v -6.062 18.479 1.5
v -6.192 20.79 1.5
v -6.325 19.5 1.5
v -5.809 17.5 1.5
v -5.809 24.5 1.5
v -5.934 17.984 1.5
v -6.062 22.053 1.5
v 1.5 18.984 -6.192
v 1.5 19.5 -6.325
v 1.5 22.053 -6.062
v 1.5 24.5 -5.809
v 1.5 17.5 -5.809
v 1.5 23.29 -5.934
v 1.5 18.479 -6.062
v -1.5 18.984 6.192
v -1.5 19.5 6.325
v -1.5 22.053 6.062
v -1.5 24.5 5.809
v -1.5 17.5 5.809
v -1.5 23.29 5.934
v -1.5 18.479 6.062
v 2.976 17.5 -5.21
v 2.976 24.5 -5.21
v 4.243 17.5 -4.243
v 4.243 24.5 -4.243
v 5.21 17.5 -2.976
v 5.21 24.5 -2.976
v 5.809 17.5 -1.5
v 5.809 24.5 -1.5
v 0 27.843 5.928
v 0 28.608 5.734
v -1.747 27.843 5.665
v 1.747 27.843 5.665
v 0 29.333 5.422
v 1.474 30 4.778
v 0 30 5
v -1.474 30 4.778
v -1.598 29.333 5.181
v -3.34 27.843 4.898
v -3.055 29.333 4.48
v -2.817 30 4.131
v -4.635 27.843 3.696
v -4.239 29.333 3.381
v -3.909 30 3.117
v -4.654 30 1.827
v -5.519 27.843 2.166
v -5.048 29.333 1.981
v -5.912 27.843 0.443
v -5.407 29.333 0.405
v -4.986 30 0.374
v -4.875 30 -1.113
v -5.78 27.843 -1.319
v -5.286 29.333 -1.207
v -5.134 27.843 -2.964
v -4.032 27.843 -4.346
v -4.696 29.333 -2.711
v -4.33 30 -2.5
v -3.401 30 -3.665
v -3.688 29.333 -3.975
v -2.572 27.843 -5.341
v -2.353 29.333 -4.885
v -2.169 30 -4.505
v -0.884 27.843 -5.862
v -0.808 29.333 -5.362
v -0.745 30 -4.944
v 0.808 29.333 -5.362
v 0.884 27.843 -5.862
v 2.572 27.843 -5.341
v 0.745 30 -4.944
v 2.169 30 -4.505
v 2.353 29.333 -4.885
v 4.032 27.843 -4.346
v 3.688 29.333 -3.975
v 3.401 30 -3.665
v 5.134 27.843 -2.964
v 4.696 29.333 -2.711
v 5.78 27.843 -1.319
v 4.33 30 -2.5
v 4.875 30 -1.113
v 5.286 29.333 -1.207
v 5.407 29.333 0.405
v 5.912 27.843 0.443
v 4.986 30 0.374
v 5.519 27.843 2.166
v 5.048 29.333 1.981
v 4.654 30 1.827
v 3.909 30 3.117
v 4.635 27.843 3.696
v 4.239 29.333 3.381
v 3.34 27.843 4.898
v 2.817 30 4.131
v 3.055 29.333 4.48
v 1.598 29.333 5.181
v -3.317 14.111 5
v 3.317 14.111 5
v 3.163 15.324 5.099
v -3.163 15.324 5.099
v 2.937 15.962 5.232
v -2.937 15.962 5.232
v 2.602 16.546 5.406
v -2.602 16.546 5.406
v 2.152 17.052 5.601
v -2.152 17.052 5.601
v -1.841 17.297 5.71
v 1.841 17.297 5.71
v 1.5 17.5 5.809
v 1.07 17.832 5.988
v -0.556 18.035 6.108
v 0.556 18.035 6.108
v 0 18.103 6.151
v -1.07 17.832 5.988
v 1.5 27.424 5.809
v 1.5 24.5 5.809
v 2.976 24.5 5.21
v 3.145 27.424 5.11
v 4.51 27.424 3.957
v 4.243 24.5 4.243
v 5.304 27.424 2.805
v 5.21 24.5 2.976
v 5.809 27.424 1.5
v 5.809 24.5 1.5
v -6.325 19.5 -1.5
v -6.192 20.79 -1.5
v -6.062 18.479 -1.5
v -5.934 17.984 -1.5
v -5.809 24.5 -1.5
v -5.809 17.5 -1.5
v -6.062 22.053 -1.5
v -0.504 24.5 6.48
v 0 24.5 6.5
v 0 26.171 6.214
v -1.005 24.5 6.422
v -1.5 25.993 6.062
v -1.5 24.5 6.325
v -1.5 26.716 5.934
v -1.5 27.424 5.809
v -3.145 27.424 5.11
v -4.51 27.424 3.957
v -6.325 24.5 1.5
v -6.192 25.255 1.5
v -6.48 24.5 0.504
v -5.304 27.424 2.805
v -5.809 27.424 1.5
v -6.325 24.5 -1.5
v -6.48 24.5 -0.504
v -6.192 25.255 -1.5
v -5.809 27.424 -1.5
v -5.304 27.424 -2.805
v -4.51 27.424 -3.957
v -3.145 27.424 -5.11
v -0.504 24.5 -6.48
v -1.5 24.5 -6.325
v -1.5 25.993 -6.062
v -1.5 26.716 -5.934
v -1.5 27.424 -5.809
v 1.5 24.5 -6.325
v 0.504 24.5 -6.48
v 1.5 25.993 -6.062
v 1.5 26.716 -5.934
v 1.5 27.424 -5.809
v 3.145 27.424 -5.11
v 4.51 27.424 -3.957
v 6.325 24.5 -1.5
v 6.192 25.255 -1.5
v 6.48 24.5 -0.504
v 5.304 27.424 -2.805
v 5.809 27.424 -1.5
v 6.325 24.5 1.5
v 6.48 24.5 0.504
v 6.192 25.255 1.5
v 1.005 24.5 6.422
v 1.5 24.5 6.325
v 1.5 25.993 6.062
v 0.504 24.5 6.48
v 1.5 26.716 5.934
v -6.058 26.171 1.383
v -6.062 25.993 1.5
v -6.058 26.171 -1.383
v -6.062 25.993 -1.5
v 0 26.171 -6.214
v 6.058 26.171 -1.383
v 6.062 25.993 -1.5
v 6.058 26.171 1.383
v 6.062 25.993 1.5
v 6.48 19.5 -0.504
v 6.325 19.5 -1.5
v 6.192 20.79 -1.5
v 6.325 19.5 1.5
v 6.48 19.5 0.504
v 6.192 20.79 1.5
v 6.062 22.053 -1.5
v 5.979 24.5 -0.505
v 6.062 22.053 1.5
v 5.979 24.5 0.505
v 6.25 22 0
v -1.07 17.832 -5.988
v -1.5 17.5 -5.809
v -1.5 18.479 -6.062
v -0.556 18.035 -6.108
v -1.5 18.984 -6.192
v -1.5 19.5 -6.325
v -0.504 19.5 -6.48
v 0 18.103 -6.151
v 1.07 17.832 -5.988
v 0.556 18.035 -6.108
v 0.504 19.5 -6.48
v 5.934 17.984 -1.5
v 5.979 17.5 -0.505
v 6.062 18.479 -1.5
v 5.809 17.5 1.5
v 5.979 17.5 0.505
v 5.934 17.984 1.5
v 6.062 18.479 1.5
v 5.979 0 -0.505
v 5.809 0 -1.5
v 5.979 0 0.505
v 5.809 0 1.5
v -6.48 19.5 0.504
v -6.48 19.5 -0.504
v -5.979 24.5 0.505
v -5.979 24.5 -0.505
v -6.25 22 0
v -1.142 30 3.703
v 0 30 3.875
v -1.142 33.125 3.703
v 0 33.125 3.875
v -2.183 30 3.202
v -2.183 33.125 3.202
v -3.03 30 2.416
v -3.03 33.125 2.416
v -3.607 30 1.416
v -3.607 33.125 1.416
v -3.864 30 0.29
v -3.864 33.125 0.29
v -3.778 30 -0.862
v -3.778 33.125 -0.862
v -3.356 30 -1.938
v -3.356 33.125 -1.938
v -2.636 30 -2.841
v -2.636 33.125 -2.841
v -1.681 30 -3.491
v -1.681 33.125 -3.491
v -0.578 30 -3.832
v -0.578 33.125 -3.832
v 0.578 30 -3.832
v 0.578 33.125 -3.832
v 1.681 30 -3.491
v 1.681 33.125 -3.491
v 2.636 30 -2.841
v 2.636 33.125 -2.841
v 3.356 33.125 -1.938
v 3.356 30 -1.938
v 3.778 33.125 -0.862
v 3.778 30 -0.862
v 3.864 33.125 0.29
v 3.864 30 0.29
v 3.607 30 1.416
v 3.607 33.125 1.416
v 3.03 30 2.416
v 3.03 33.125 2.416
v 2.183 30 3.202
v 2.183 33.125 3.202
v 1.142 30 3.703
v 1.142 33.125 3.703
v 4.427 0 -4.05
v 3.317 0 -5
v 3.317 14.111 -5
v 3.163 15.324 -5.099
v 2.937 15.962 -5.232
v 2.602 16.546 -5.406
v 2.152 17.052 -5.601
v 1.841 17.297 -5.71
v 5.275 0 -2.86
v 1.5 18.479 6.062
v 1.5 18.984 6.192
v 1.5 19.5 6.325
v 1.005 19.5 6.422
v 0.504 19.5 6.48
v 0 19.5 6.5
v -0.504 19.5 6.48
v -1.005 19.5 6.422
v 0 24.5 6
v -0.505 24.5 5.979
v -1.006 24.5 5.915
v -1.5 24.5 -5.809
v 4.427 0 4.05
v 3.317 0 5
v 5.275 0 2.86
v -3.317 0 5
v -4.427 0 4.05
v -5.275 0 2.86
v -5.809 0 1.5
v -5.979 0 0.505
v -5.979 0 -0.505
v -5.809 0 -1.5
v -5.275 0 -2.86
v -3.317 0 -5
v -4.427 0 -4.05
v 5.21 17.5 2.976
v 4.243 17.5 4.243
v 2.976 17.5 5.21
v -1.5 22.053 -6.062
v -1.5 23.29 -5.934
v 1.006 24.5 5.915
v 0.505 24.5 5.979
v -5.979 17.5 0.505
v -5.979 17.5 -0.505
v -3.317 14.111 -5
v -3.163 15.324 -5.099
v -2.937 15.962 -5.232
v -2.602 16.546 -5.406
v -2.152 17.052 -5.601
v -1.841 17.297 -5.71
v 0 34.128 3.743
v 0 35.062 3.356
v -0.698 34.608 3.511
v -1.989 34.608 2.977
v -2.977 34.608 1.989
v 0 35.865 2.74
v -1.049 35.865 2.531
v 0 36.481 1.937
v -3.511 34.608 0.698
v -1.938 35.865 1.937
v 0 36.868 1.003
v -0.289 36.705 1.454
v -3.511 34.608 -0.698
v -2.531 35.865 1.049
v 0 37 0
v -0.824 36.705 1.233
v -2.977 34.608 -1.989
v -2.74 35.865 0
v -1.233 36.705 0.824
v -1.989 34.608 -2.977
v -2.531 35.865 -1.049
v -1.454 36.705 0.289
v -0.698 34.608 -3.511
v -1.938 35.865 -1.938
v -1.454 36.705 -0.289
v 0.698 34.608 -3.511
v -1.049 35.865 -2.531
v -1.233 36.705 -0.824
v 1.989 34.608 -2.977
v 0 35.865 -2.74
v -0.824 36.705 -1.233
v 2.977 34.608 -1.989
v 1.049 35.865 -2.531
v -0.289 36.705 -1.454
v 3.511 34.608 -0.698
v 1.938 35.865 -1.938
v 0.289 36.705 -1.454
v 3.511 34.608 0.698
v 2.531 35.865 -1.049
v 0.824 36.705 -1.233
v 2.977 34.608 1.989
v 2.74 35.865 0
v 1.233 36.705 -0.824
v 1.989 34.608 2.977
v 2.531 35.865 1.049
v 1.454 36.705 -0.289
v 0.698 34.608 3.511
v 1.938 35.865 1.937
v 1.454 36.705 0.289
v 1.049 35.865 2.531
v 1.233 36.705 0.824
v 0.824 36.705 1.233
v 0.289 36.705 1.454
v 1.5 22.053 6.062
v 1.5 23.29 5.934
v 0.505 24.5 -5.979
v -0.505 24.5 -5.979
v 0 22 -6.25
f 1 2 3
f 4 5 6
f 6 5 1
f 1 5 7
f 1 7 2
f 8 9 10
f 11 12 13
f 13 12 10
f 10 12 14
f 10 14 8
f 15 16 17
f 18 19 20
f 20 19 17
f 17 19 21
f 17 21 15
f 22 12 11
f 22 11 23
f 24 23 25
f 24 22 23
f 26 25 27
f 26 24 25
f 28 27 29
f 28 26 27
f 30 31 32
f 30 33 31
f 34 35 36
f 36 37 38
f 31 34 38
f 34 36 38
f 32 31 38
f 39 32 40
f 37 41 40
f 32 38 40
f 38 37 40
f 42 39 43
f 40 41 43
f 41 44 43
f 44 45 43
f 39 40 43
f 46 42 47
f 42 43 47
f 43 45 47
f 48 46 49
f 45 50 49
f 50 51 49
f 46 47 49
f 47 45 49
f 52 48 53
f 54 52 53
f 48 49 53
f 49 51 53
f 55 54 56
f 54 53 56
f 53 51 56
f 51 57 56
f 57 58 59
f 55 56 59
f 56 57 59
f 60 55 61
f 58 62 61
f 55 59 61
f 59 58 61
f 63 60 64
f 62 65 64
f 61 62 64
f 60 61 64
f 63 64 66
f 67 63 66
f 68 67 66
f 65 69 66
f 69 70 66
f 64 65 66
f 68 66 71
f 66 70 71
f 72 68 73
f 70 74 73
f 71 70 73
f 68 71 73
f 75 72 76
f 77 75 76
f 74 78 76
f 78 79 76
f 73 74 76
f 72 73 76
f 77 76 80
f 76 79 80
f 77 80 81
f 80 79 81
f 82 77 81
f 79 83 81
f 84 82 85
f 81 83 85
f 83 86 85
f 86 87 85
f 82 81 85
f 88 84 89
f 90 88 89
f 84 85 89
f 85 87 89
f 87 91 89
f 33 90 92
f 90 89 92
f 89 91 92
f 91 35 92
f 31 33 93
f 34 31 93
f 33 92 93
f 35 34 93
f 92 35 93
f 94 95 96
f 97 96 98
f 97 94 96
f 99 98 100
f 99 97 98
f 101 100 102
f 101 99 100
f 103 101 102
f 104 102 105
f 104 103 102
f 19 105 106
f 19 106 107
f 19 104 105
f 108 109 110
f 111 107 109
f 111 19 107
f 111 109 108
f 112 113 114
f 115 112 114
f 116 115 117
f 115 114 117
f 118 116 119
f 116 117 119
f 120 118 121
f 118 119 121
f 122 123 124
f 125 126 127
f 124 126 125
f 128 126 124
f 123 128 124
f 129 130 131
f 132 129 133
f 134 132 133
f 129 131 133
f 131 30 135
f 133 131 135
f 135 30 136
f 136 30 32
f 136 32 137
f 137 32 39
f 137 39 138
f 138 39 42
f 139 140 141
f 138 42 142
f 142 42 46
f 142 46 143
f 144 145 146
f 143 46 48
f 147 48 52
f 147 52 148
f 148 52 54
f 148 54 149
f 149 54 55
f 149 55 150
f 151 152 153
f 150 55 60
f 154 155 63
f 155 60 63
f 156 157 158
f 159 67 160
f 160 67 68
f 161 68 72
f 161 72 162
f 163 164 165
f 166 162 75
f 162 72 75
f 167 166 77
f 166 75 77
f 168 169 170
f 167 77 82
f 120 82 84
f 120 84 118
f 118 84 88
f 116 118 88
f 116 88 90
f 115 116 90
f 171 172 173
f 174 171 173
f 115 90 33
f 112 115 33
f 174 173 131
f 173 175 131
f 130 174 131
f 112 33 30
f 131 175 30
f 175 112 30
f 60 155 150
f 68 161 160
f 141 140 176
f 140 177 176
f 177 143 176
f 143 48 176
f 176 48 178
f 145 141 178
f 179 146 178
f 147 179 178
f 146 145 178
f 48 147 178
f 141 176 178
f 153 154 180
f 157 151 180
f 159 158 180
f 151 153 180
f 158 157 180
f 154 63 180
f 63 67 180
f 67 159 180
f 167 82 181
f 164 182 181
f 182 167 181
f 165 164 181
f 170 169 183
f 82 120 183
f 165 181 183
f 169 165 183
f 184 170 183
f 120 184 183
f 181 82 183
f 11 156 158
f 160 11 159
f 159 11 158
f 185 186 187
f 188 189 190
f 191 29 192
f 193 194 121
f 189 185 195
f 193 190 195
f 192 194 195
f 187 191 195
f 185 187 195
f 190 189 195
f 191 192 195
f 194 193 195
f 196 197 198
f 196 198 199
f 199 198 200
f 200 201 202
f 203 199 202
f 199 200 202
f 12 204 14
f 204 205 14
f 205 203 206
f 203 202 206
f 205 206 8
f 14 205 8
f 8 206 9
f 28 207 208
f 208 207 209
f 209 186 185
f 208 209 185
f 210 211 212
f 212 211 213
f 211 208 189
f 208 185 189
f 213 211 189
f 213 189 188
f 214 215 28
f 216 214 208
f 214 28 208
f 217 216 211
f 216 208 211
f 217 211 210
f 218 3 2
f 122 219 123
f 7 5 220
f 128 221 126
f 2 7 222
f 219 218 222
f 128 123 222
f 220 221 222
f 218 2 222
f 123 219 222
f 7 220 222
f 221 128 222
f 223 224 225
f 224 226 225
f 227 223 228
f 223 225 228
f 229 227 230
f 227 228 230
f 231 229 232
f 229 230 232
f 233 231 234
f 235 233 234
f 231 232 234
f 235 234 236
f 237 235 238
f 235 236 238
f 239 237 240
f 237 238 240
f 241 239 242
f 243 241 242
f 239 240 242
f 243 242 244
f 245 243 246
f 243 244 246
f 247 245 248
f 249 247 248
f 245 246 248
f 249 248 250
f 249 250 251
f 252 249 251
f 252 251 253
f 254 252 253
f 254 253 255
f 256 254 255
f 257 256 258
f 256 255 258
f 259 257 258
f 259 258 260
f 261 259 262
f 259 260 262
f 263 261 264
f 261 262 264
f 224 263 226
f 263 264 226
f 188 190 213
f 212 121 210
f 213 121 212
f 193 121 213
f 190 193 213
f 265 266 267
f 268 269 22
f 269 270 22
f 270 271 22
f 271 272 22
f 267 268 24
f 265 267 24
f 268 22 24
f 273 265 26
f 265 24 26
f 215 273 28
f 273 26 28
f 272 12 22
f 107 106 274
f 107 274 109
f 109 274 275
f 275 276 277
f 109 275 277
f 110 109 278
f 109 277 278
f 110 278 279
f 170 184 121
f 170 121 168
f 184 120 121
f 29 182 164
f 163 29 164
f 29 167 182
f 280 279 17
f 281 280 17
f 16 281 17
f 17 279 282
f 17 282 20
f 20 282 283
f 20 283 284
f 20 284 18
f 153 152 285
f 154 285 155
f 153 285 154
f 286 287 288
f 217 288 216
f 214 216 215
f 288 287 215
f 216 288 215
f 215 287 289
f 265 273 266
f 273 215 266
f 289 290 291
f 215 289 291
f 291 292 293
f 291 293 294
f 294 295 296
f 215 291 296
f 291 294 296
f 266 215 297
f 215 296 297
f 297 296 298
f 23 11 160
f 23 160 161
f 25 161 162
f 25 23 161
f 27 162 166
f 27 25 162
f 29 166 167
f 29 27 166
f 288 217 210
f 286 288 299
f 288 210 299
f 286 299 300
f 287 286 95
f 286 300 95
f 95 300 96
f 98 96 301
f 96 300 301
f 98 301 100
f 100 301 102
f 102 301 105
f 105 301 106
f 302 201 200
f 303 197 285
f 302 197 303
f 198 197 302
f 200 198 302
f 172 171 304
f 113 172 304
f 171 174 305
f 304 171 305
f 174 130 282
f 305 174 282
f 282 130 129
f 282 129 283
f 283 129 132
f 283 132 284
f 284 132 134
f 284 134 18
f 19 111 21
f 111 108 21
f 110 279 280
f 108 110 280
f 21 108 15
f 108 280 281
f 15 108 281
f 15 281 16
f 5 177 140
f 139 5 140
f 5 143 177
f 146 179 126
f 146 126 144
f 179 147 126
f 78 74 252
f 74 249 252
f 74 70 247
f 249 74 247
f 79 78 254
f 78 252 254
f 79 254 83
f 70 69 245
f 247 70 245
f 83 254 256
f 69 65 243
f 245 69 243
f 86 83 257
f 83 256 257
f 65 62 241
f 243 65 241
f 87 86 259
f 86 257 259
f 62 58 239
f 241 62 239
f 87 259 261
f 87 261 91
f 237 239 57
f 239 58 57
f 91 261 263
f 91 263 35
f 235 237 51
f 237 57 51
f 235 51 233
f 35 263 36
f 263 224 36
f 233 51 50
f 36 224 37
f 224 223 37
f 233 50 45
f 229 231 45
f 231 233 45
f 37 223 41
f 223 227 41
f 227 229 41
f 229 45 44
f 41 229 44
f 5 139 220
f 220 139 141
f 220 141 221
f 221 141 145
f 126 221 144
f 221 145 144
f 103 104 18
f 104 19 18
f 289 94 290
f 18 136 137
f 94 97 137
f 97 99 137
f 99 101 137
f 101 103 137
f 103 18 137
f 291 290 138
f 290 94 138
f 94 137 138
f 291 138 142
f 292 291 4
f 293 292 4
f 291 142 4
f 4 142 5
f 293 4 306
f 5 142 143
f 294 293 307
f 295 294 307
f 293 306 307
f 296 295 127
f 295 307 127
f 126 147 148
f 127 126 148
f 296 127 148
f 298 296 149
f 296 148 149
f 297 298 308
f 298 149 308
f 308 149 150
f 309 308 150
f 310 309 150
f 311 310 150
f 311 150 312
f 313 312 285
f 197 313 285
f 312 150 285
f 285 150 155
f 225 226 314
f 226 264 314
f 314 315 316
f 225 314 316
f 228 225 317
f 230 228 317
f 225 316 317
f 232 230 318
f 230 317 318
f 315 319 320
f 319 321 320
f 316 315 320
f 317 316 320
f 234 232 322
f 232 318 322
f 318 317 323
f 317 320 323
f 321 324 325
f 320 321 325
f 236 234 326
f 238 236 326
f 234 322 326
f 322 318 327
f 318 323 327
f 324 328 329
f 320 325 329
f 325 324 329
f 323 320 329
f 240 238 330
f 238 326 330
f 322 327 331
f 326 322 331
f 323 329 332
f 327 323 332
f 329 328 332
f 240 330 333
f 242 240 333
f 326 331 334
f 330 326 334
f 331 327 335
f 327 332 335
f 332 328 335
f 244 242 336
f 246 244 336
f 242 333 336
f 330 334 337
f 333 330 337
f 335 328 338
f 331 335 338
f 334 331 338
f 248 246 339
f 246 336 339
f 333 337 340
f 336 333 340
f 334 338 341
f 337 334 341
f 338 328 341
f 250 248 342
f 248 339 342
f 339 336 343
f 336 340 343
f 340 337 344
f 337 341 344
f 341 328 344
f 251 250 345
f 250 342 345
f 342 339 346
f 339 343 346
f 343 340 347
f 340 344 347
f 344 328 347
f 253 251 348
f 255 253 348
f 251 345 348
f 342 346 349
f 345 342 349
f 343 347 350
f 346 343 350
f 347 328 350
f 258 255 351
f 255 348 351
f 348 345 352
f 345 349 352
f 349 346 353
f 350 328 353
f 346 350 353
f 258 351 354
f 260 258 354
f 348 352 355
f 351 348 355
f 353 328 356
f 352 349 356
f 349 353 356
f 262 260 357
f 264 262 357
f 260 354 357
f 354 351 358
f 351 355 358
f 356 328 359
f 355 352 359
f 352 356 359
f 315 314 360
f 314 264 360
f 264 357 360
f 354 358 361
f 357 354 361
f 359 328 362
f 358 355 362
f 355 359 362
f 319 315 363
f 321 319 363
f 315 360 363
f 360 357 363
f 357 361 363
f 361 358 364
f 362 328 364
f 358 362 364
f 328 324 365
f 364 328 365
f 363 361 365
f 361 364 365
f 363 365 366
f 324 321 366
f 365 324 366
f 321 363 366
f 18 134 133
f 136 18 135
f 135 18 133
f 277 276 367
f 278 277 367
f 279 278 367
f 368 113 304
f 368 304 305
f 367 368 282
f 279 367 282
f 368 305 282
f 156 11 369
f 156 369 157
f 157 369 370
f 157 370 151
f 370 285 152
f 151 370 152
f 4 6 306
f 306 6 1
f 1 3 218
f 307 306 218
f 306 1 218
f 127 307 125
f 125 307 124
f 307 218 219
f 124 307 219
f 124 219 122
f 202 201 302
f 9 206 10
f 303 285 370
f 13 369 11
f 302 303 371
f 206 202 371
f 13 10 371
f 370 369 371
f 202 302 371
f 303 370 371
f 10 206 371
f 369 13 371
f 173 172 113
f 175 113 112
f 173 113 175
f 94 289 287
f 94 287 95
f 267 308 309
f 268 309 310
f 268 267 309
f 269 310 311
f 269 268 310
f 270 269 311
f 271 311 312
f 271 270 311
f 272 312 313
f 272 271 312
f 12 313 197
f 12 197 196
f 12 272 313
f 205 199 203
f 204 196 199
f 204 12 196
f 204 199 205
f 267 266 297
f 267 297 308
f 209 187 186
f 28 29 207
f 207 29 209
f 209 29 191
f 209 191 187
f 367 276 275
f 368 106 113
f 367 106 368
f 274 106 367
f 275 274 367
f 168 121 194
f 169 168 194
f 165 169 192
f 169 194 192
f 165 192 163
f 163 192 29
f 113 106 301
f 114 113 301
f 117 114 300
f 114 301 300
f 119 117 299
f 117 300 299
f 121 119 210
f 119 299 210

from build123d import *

# Parameters (mm, degrees)
CUT_EXTRUDE1_DEPTH = 39.124795081
CUT_EXTRUDE2_DEPTH = 10


with BuildPart() as part:
    # Sketch2 → Revolve1 (revolve)
    with BuildSketch(Plane.XY, mode=Mode.PRIVATE) as revolve1_sk:
        with BuildLine():
            Line((0, 0), (6, 0))
            Line((6, 0), (6, 17.5))
            Line((6, 17.5), (6.5, 19.5))
            Line((6.5, 19.5), (6, 24.5))
            Line((6, 24.5), (6.5, 24.5))
            Line((6.5, 24.5), (5.928481161, 27.842658555))
            ThreePointArc((5.928481161, 27.842658555), (5.59270884, 28.976619718), (5, 30))
            Line((5, 30), (3.875, 30))
            Line((3.875, 30), (3.875, 33.125))
            ThreePointArc((3.875, 33.125), (2.740038777, 35.865038777), (0, 37))
            Line((0, 37), (0, 0))
        make_face()
    revolve(revolve1_sk.sketch.rotate(Axis((0, 37, 0), (0, -1, 0)), 90), axis=Axis((0, 37, 0), (0, -1, 0)))

    # Sketch3 → Cut-Extrude1 (cut, through all)
    with BuildSketch(Plane.XZ):
        with BuildLine():
            Line((-5.809475019, 1.5), (-7.579692196, 1.5))
            Line((-7.579692196, 1.5), (-7.579692196, 7.495465701))
            Line((-7.579692196, 7.495465701), (-1.5, 7.495465701))
            Line((-1.5, 7.495465701), (-1.5, 5.809475019))
            ThreePointArc((-1.5, 5.809475019), (-4.242640687, 4.242640687), (-5.809475019, 1.5))
        make_face()
        with BuildLine():
            Line((1.5, 7.495465701), (1.5, 5.809475019))
            ThreePointArc((1.5, 5.809475019), (4.242640687, 4.242640687), (5.809475019, 1.5))
            Line((5.809475019, 1.5), (7.579692196, 1.5))
            Line((7.579692196, 1.5), (7.579692196, 7.495465701))
            Line((7.579692196, 7.495465701), (1.5, 7.495465701))
        make_face()
        with BuildLine():
            Line((5.809475019, -1.5), (7.579692196, -1.5))
            Line((7.579692196, -1.5), (7.579692196, -7.495465701))
            Line((7.579692196, -7.495465701), (1.5, -7.495465701))
            Line((1.5, -7.495465701), (1.5, -5.809475019))
            ThreePointArc((1.5, -5.809475019), (4.242640687, -4.242640687), (5.809475019, -1.5))
        make_face()
        with BuildLine():
            Line((-1.5, -7.495465701), (-1.5, -5.809475019))
            ThreePointArc((-1.5, -5.809475019), (-4.242640687, -4.242640687), (-5.809475019, -1.5))
            Line((-5.809475019, -1.5), (-7.579692196, -1.5))
            Line((-7.579692196, -1.5), (-7.579692196, -7.495465701))
            Line((-7.579692196, -7.495465701), (-1.5, -7.495465701))
        make_face()
    extrude(amount=-CUT_EXTRUDE1_DEPTH, mode=Mode.SUBTRACT)

    # Sketch4 → Cut-Extrude2 (cut, symmetric)
    with BuildSketch(Plane(origin=(0, 0, 0), x_dir=(0, 0, -1), z_dir=(1, 0, 0))):
        with BuildLine():
            Line((-5, 0), (-5, 14.110770665))
            ThreePointArc((-5, 14.110770665), (-7.196699141, 19.414071524), (-12.5, 21.610770665))
            Line((-12.5, 21.610770665), (-12.5, 0))
            Line((-12.5, 0), (-5, 0))
        make_face()
        with BuildLine():
            Line((12.5, 0), (5, 0))
            Line((5, 0), (5, 14.110770665))
            ThreePointArc((5, 14.110770665), (7.196699141, 19.414071524), (12.5, 21.610770665))
            Line((12.5, 21.610770665), (12.5, 0))
        make_face()
    extrude(amount=CUT_EXTRUDE2_DEPTH, both=True, mode=Mode.SUBTRACT)


solid = part.part
